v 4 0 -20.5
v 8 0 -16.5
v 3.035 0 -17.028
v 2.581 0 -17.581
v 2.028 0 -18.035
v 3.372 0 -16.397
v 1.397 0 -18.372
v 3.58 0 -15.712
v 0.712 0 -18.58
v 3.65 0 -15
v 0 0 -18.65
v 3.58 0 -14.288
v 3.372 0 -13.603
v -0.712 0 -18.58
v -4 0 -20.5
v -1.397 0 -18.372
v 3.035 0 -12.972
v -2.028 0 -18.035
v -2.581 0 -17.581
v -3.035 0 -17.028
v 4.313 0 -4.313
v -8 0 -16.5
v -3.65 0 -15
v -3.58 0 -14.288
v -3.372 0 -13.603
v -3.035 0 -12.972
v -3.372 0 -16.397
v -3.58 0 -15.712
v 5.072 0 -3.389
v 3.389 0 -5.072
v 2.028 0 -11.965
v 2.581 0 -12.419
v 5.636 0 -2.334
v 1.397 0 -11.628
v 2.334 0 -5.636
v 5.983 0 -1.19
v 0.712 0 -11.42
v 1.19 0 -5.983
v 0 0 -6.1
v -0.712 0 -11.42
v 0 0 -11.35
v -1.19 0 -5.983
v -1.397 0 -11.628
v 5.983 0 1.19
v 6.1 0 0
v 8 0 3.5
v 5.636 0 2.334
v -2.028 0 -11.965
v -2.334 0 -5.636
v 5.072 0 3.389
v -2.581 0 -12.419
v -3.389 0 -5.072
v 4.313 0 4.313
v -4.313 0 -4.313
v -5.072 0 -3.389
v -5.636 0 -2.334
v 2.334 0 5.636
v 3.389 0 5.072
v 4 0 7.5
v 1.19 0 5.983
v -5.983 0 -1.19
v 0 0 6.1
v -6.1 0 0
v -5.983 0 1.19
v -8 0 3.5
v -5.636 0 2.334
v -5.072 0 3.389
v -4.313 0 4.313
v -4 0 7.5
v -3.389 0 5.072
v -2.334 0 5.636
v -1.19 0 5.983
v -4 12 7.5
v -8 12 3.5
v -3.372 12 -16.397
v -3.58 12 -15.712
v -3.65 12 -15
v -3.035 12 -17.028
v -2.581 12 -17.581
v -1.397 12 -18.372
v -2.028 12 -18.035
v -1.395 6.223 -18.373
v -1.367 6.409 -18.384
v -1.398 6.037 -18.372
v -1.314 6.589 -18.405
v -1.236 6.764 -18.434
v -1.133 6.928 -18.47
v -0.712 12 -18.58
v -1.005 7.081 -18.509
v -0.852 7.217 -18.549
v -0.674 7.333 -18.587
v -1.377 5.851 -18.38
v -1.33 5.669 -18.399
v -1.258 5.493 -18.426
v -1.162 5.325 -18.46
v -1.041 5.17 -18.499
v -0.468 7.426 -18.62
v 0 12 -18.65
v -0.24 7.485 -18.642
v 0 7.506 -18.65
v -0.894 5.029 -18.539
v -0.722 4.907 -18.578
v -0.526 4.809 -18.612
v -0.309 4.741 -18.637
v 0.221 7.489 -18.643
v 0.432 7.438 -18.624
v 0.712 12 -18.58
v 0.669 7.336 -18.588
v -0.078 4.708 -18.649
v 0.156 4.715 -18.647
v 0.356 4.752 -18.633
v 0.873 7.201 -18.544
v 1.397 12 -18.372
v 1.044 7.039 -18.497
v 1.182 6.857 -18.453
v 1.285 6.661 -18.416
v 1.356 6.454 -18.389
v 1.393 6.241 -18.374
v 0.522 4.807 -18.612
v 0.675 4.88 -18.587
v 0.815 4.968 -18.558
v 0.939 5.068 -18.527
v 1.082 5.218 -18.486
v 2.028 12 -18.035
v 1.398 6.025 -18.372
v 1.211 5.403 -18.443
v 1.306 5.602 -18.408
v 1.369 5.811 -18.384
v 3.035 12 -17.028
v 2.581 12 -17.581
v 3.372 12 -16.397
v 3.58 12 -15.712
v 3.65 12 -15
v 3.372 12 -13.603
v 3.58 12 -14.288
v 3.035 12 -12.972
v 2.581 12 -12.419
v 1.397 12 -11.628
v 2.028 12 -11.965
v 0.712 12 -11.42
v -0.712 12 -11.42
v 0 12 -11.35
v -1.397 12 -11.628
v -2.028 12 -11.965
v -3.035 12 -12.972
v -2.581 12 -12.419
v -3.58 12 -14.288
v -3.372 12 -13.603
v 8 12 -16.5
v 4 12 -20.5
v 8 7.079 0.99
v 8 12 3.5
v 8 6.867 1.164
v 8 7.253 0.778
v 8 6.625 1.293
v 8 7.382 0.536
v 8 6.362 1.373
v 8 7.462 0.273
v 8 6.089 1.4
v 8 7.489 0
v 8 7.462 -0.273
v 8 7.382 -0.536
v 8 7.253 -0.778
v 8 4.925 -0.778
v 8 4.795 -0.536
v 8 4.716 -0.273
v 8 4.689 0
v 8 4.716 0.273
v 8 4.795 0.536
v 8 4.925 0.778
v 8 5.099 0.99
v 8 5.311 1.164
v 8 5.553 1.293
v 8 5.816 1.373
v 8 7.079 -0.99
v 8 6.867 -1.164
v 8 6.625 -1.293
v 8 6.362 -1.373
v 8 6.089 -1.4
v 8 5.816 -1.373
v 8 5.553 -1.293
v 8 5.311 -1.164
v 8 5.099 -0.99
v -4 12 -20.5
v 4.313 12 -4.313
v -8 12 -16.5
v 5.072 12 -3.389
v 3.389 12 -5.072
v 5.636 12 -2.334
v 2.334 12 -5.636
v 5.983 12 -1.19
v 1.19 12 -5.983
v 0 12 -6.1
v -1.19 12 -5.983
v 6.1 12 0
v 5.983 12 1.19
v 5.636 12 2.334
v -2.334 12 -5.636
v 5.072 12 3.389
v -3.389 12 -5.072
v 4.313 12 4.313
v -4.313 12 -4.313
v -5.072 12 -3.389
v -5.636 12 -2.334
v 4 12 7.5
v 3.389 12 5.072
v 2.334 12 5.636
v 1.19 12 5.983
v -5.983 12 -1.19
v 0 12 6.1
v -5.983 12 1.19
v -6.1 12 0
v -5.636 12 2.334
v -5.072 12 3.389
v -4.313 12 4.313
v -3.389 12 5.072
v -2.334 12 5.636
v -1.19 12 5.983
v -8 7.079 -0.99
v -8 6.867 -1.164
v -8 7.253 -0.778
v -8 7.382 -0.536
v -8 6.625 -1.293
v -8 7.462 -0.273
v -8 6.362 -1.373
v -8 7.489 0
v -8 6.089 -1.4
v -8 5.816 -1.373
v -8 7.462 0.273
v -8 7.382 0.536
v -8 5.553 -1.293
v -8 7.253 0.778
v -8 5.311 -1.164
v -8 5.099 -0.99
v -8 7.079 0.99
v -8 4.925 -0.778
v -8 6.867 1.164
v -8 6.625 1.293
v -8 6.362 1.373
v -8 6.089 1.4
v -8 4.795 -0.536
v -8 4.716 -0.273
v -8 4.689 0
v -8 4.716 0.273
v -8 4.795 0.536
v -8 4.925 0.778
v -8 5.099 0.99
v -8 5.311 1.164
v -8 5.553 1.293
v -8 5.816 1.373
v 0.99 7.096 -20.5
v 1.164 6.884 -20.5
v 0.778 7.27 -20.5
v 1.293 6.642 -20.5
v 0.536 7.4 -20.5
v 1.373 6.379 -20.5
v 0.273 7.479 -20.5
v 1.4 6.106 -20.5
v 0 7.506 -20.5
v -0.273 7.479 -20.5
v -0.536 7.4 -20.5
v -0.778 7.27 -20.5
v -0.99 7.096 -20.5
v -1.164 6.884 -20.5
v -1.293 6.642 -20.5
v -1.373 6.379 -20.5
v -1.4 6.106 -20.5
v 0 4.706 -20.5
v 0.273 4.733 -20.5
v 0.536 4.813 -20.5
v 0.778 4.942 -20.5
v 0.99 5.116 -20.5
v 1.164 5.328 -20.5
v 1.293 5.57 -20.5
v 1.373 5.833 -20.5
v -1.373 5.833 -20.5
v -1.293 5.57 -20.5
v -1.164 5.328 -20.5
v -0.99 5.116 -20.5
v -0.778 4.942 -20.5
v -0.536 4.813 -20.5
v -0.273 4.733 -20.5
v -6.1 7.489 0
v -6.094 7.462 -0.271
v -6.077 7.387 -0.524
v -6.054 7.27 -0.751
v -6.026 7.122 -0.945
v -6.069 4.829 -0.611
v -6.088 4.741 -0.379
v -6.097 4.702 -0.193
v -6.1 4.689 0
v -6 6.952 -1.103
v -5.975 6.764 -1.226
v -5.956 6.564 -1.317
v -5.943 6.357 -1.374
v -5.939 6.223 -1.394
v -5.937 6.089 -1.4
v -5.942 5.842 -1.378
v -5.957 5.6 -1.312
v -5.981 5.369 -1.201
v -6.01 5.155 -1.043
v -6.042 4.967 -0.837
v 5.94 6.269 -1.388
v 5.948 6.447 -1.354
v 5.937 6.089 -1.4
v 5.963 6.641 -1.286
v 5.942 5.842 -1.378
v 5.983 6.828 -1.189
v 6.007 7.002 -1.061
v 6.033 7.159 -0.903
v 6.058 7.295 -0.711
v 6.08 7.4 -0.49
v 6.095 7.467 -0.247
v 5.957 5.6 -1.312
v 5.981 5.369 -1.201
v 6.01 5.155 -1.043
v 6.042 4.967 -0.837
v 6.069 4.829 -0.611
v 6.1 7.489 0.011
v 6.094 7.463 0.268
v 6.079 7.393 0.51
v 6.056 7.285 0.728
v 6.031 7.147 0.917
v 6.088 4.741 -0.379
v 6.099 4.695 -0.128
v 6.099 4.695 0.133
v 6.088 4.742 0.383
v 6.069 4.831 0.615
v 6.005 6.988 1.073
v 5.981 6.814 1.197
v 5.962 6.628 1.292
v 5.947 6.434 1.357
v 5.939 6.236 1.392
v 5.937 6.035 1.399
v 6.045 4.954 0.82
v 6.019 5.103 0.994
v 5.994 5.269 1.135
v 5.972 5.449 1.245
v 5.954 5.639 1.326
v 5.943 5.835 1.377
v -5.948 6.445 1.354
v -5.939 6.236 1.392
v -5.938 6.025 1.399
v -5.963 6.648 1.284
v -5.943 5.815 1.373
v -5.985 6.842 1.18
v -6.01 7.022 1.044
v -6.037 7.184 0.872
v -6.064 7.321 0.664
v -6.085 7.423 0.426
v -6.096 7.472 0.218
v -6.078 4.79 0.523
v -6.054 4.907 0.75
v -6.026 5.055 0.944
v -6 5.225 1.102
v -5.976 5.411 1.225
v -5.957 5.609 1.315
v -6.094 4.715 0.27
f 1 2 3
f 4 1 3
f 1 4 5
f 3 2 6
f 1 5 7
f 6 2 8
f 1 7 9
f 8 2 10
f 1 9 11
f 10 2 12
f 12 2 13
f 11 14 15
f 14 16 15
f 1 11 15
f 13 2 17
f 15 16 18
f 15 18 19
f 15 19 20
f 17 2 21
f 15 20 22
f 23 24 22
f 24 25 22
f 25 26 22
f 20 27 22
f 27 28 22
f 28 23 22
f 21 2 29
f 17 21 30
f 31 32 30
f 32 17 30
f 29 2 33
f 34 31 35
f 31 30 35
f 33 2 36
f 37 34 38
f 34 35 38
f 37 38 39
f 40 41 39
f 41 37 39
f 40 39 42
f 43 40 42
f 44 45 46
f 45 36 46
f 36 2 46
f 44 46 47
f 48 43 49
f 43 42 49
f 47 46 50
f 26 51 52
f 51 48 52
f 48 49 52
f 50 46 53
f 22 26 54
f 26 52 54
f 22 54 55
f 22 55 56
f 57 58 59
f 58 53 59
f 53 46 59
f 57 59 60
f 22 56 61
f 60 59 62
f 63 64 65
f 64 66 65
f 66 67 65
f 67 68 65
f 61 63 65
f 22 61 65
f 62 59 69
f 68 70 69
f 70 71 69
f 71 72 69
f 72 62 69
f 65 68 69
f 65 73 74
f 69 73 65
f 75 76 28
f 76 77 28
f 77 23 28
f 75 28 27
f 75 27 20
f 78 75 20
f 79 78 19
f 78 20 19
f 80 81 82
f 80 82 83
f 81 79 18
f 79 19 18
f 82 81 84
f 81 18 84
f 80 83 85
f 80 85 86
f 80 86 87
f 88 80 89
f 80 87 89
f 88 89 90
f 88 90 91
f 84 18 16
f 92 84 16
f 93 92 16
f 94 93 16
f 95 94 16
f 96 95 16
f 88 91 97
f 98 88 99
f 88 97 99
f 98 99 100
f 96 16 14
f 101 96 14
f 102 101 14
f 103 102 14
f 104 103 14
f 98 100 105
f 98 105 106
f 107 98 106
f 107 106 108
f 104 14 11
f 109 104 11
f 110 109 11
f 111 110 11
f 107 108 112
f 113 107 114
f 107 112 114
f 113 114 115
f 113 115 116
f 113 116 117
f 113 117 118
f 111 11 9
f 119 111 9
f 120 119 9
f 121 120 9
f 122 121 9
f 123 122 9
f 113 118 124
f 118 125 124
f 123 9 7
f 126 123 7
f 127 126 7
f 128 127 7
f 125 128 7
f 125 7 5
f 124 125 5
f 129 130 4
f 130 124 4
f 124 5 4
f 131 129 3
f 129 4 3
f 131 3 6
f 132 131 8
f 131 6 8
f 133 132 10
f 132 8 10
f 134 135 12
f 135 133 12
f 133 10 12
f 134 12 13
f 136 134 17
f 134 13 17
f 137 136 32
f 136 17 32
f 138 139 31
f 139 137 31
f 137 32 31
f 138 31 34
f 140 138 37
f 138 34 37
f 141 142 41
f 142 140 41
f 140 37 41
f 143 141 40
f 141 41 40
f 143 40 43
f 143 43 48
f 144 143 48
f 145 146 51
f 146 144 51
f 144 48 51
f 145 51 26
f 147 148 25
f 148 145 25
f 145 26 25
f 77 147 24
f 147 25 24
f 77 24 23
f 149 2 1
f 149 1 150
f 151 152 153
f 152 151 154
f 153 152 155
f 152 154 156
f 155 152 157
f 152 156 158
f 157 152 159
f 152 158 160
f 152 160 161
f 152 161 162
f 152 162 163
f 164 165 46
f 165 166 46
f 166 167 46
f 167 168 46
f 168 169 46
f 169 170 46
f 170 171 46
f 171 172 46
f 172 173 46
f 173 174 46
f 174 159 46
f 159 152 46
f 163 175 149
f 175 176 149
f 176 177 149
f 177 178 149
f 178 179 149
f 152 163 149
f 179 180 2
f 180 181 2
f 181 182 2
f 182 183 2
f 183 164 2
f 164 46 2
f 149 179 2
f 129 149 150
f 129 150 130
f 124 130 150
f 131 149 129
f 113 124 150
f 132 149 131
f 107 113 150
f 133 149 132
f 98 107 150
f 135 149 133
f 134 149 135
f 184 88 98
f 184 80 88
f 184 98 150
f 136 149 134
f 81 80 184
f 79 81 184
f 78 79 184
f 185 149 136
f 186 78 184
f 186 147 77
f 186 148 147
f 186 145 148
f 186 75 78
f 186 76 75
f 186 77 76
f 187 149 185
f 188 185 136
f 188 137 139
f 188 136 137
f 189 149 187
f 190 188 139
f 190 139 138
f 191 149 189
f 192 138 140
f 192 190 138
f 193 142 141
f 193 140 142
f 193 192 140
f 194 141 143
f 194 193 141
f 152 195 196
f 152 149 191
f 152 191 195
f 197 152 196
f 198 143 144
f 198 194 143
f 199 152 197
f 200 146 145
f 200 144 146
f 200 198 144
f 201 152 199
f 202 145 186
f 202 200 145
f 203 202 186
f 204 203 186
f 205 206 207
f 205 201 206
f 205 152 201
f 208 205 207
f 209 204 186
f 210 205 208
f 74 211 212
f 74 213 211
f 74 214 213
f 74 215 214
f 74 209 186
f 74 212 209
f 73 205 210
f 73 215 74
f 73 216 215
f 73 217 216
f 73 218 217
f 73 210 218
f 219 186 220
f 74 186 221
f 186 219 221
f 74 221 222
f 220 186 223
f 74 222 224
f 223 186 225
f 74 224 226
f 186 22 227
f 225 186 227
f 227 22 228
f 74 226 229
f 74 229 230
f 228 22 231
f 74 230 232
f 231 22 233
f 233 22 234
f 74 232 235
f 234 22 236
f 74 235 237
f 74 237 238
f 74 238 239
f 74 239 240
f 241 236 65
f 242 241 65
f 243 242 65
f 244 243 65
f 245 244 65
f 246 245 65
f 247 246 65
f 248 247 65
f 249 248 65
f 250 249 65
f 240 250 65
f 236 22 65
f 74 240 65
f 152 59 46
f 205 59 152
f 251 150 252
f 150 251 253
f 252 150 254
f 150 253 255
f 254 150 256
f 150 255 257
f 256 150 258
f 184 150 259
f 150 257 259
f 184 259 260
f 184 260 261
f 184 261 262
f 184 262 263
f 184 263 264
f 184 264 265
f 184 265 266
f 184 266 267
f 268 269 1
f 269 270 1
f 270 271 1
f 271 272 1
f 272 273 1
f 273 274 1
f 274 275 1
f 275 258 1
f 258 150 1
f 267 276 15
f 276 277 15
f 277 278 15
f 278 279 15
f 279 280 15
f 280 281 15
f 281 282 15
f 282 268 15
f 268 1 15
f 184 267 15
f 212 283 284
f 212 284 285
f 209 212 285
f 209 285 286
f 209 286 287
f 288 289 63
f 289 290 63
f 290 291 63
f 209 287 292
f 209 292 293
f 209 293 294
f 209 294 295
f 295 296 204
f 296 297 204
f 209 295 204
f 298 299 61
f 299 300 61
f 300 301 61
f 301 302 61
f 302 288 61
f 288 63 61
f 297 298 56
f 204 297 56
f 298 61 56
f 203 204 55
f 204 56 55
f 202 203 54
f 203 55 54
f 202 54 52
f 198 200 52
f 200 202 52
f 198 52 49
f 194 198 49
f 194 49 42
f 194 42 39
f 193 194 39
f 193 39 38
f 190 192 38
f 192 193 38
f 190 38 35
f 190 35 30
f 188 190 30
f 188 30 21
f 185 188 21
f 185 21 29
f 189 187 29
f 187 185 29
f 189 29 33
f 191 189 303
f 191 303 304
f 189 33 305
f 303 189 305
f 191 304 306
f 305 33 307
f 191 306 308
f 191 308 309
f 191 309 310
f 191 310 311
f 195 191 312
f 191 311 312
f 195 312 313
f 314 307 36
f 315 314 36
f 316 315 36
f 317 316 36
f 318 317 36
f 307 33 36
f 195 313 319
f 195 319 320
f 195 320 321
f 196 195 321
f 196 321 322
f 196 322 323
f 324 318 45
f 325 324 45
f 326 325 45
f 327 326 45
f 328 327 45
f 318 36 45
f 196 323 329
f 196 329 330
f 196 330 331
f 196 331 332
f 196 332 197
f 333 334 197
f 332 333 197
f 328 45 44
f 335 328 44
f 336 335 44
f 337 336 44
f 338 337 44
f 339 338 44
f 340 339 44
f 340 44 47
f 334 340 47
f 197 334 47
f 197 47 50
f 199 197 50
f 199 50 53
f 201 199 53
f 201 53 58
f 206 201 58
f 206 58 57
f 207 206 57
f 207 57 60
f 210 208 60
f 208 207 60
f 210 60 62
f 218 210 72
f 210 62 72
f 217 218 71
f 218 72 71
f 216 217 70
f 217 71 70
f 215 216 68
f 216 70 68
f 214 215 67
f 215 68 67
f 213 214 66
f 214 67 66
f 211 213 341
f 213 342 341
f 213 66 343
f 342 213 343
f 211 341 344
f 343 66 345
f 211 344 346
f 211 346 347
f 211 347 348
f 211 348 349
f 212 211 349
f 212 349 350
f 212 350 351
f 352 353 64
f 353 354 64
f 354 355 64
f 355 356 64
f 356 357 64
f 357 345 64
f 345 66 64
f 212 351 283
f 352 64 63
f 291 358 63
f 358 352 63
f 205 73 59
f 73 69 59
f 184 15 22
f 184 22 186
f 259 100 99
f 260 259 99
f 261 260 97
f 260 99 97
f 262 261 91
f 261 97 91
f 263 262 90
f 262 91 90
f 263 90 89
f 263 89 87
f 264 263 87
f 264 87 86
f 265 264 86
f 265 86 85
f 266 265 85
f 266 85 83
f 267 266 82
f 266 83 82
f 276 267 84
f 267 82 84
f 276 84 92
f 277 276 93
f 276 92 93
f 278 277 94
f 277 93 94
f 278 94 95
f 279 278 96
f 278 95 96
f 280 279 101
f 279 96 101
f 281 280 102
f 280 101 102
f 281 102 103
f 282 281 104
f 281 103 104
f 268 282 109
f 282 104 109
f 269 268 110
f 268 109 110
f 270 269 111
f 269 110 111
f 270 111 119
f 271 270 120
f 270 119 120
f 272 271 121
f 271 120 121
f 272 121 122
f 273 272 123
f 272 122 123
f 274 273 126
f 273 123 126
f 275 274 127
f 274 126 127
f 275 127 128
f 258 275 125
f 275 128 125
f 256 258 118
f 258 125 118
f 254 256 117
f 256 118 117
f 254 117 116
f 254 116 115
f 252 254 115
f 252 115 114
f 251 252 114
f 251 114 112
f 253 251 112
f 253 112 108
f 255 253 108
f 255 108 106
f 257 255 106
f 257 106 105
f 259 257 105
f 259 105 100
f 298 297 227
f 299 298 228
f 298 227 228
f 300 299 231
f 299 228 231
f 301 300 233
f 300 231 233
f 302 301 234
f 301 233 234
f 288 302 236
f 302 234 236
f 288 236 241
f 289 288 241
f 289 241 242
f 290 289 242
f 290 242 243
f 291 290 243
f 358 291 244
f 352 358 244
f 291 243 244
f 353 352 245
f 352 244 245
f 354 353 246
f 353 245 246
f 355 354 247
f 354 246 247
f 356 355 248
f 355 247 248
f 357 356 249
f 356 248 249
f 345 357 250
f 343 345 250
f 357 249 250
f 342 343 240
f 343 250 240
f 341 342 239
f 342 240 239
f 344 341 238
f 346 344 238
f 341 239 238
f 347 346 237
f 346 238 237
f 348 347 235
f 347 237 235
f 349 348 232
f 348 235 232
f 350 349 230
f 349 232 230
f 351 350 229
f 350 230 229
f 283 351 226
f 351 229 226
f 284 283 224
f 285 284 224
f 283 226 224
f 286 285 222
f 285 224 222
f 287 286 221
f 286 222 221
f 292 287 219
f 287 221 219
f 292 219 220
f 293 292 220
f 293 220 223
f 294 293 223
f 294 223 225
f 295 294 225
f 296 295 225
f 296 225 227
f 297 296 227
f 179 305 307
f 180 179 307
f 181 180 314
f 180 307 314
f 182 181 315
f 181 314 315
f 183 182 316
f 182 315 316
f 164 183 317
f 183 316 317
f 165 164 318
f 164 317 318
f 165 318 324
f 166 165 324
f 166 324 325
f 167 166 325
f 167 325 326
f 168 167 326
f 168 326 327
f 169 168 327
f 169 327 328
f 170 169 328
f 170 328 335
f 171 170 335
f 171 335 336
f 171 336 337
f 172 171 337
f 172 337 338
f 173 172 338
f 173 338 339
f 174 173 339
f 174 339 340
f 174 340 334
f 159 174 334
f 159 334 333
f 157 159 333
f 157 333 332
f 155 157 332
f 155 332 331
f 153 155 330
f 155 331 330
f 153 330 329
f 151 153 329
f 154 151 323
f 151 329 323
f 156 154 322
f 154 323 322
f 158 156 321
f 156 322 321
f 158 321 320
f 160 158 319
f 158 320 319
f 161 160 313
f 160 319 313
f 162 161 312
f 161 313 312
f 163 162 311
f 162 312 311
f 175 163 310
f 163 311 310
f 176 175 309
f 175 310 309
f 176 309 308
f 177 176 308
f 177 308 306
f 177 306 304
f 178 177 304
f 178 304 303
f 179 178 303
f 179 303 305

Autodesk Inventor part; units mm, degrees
ref_plane "YZ Plane" through (0, 0, 0) normal (1, 0, 0) x (0, 1, 0)
ref_plane "XZ Plane" through (0, 0, 0) normal (0, 1, 0) x (-1, 0, 0)
ref_plane "XY Plane" through (0, 0, 0) normal (0, 0, 1) x (1, 0, 0)
sketch "Sketch1" plane through (0, 0, 0) normal (0, 1, 0) x (-1, 0, 0)
  circle A0 centre (0, 0) radius 6.1
  circle A1 centre (0, -15) radius 3.65
  line L0 (8, 7.5) -> (-8, 7.5)
  line L1 (-8, 7.5) -> (-8, -20.5)
  line L2 (-8, -20.5) -> (8, -20.5)
  line L3 (8, -20.5) -> (8, 7.5)
  dimension "d0" = 12.2
  dimension "d1" = 7.3
  dimension "d2" = 15
  dimension "d3" = 16
  dimension "d4" = 8
  dimension "d5" = 28
  dimension "d6" = 5.5
extrude "Extrusion1" add sketch "Sketch1" along normal blind 12
chamfer "Chamfer1" distance 4 angle 45 4 edges at (8, 6, -20.5) (-8, 6, -20.5) (8, 6, 7.5) (-8, 6, 7.5)
sketch "Sketch3" plane through (8, 0, 3.5) normal (1, 0, 0) x (0, 0, -1)
  line L0 (-4, 12) -> (-4, 0) projected
  point P0 (3.5, 0)
  point P1 (3.5, 6.0888)
  dimension "d12" = 7.5
hole "Hole1" at (8, 6.0888, 0) direction (-1, 0, 0) diameter 2.8 depth 17.75
sketch "Sketch4" plane through (4, 0, -20.5) normal (0, 0, -1) x (-1, 0, 0)
  line L0 (8, 12) -> (8, 0) projected
  line L1 (0, 0) -> (8, 0) projected
  point P0 (4, 0)
  point P1 (4, 6.1062)
  dimension "d20" = 4
  dimension "d21" = 6.1062
hole "Hole2" at (0, 6.1062, -20.5) direction (0, 0, 1) diameter 2.8 depth 5
properties part number "Z axis collar"
